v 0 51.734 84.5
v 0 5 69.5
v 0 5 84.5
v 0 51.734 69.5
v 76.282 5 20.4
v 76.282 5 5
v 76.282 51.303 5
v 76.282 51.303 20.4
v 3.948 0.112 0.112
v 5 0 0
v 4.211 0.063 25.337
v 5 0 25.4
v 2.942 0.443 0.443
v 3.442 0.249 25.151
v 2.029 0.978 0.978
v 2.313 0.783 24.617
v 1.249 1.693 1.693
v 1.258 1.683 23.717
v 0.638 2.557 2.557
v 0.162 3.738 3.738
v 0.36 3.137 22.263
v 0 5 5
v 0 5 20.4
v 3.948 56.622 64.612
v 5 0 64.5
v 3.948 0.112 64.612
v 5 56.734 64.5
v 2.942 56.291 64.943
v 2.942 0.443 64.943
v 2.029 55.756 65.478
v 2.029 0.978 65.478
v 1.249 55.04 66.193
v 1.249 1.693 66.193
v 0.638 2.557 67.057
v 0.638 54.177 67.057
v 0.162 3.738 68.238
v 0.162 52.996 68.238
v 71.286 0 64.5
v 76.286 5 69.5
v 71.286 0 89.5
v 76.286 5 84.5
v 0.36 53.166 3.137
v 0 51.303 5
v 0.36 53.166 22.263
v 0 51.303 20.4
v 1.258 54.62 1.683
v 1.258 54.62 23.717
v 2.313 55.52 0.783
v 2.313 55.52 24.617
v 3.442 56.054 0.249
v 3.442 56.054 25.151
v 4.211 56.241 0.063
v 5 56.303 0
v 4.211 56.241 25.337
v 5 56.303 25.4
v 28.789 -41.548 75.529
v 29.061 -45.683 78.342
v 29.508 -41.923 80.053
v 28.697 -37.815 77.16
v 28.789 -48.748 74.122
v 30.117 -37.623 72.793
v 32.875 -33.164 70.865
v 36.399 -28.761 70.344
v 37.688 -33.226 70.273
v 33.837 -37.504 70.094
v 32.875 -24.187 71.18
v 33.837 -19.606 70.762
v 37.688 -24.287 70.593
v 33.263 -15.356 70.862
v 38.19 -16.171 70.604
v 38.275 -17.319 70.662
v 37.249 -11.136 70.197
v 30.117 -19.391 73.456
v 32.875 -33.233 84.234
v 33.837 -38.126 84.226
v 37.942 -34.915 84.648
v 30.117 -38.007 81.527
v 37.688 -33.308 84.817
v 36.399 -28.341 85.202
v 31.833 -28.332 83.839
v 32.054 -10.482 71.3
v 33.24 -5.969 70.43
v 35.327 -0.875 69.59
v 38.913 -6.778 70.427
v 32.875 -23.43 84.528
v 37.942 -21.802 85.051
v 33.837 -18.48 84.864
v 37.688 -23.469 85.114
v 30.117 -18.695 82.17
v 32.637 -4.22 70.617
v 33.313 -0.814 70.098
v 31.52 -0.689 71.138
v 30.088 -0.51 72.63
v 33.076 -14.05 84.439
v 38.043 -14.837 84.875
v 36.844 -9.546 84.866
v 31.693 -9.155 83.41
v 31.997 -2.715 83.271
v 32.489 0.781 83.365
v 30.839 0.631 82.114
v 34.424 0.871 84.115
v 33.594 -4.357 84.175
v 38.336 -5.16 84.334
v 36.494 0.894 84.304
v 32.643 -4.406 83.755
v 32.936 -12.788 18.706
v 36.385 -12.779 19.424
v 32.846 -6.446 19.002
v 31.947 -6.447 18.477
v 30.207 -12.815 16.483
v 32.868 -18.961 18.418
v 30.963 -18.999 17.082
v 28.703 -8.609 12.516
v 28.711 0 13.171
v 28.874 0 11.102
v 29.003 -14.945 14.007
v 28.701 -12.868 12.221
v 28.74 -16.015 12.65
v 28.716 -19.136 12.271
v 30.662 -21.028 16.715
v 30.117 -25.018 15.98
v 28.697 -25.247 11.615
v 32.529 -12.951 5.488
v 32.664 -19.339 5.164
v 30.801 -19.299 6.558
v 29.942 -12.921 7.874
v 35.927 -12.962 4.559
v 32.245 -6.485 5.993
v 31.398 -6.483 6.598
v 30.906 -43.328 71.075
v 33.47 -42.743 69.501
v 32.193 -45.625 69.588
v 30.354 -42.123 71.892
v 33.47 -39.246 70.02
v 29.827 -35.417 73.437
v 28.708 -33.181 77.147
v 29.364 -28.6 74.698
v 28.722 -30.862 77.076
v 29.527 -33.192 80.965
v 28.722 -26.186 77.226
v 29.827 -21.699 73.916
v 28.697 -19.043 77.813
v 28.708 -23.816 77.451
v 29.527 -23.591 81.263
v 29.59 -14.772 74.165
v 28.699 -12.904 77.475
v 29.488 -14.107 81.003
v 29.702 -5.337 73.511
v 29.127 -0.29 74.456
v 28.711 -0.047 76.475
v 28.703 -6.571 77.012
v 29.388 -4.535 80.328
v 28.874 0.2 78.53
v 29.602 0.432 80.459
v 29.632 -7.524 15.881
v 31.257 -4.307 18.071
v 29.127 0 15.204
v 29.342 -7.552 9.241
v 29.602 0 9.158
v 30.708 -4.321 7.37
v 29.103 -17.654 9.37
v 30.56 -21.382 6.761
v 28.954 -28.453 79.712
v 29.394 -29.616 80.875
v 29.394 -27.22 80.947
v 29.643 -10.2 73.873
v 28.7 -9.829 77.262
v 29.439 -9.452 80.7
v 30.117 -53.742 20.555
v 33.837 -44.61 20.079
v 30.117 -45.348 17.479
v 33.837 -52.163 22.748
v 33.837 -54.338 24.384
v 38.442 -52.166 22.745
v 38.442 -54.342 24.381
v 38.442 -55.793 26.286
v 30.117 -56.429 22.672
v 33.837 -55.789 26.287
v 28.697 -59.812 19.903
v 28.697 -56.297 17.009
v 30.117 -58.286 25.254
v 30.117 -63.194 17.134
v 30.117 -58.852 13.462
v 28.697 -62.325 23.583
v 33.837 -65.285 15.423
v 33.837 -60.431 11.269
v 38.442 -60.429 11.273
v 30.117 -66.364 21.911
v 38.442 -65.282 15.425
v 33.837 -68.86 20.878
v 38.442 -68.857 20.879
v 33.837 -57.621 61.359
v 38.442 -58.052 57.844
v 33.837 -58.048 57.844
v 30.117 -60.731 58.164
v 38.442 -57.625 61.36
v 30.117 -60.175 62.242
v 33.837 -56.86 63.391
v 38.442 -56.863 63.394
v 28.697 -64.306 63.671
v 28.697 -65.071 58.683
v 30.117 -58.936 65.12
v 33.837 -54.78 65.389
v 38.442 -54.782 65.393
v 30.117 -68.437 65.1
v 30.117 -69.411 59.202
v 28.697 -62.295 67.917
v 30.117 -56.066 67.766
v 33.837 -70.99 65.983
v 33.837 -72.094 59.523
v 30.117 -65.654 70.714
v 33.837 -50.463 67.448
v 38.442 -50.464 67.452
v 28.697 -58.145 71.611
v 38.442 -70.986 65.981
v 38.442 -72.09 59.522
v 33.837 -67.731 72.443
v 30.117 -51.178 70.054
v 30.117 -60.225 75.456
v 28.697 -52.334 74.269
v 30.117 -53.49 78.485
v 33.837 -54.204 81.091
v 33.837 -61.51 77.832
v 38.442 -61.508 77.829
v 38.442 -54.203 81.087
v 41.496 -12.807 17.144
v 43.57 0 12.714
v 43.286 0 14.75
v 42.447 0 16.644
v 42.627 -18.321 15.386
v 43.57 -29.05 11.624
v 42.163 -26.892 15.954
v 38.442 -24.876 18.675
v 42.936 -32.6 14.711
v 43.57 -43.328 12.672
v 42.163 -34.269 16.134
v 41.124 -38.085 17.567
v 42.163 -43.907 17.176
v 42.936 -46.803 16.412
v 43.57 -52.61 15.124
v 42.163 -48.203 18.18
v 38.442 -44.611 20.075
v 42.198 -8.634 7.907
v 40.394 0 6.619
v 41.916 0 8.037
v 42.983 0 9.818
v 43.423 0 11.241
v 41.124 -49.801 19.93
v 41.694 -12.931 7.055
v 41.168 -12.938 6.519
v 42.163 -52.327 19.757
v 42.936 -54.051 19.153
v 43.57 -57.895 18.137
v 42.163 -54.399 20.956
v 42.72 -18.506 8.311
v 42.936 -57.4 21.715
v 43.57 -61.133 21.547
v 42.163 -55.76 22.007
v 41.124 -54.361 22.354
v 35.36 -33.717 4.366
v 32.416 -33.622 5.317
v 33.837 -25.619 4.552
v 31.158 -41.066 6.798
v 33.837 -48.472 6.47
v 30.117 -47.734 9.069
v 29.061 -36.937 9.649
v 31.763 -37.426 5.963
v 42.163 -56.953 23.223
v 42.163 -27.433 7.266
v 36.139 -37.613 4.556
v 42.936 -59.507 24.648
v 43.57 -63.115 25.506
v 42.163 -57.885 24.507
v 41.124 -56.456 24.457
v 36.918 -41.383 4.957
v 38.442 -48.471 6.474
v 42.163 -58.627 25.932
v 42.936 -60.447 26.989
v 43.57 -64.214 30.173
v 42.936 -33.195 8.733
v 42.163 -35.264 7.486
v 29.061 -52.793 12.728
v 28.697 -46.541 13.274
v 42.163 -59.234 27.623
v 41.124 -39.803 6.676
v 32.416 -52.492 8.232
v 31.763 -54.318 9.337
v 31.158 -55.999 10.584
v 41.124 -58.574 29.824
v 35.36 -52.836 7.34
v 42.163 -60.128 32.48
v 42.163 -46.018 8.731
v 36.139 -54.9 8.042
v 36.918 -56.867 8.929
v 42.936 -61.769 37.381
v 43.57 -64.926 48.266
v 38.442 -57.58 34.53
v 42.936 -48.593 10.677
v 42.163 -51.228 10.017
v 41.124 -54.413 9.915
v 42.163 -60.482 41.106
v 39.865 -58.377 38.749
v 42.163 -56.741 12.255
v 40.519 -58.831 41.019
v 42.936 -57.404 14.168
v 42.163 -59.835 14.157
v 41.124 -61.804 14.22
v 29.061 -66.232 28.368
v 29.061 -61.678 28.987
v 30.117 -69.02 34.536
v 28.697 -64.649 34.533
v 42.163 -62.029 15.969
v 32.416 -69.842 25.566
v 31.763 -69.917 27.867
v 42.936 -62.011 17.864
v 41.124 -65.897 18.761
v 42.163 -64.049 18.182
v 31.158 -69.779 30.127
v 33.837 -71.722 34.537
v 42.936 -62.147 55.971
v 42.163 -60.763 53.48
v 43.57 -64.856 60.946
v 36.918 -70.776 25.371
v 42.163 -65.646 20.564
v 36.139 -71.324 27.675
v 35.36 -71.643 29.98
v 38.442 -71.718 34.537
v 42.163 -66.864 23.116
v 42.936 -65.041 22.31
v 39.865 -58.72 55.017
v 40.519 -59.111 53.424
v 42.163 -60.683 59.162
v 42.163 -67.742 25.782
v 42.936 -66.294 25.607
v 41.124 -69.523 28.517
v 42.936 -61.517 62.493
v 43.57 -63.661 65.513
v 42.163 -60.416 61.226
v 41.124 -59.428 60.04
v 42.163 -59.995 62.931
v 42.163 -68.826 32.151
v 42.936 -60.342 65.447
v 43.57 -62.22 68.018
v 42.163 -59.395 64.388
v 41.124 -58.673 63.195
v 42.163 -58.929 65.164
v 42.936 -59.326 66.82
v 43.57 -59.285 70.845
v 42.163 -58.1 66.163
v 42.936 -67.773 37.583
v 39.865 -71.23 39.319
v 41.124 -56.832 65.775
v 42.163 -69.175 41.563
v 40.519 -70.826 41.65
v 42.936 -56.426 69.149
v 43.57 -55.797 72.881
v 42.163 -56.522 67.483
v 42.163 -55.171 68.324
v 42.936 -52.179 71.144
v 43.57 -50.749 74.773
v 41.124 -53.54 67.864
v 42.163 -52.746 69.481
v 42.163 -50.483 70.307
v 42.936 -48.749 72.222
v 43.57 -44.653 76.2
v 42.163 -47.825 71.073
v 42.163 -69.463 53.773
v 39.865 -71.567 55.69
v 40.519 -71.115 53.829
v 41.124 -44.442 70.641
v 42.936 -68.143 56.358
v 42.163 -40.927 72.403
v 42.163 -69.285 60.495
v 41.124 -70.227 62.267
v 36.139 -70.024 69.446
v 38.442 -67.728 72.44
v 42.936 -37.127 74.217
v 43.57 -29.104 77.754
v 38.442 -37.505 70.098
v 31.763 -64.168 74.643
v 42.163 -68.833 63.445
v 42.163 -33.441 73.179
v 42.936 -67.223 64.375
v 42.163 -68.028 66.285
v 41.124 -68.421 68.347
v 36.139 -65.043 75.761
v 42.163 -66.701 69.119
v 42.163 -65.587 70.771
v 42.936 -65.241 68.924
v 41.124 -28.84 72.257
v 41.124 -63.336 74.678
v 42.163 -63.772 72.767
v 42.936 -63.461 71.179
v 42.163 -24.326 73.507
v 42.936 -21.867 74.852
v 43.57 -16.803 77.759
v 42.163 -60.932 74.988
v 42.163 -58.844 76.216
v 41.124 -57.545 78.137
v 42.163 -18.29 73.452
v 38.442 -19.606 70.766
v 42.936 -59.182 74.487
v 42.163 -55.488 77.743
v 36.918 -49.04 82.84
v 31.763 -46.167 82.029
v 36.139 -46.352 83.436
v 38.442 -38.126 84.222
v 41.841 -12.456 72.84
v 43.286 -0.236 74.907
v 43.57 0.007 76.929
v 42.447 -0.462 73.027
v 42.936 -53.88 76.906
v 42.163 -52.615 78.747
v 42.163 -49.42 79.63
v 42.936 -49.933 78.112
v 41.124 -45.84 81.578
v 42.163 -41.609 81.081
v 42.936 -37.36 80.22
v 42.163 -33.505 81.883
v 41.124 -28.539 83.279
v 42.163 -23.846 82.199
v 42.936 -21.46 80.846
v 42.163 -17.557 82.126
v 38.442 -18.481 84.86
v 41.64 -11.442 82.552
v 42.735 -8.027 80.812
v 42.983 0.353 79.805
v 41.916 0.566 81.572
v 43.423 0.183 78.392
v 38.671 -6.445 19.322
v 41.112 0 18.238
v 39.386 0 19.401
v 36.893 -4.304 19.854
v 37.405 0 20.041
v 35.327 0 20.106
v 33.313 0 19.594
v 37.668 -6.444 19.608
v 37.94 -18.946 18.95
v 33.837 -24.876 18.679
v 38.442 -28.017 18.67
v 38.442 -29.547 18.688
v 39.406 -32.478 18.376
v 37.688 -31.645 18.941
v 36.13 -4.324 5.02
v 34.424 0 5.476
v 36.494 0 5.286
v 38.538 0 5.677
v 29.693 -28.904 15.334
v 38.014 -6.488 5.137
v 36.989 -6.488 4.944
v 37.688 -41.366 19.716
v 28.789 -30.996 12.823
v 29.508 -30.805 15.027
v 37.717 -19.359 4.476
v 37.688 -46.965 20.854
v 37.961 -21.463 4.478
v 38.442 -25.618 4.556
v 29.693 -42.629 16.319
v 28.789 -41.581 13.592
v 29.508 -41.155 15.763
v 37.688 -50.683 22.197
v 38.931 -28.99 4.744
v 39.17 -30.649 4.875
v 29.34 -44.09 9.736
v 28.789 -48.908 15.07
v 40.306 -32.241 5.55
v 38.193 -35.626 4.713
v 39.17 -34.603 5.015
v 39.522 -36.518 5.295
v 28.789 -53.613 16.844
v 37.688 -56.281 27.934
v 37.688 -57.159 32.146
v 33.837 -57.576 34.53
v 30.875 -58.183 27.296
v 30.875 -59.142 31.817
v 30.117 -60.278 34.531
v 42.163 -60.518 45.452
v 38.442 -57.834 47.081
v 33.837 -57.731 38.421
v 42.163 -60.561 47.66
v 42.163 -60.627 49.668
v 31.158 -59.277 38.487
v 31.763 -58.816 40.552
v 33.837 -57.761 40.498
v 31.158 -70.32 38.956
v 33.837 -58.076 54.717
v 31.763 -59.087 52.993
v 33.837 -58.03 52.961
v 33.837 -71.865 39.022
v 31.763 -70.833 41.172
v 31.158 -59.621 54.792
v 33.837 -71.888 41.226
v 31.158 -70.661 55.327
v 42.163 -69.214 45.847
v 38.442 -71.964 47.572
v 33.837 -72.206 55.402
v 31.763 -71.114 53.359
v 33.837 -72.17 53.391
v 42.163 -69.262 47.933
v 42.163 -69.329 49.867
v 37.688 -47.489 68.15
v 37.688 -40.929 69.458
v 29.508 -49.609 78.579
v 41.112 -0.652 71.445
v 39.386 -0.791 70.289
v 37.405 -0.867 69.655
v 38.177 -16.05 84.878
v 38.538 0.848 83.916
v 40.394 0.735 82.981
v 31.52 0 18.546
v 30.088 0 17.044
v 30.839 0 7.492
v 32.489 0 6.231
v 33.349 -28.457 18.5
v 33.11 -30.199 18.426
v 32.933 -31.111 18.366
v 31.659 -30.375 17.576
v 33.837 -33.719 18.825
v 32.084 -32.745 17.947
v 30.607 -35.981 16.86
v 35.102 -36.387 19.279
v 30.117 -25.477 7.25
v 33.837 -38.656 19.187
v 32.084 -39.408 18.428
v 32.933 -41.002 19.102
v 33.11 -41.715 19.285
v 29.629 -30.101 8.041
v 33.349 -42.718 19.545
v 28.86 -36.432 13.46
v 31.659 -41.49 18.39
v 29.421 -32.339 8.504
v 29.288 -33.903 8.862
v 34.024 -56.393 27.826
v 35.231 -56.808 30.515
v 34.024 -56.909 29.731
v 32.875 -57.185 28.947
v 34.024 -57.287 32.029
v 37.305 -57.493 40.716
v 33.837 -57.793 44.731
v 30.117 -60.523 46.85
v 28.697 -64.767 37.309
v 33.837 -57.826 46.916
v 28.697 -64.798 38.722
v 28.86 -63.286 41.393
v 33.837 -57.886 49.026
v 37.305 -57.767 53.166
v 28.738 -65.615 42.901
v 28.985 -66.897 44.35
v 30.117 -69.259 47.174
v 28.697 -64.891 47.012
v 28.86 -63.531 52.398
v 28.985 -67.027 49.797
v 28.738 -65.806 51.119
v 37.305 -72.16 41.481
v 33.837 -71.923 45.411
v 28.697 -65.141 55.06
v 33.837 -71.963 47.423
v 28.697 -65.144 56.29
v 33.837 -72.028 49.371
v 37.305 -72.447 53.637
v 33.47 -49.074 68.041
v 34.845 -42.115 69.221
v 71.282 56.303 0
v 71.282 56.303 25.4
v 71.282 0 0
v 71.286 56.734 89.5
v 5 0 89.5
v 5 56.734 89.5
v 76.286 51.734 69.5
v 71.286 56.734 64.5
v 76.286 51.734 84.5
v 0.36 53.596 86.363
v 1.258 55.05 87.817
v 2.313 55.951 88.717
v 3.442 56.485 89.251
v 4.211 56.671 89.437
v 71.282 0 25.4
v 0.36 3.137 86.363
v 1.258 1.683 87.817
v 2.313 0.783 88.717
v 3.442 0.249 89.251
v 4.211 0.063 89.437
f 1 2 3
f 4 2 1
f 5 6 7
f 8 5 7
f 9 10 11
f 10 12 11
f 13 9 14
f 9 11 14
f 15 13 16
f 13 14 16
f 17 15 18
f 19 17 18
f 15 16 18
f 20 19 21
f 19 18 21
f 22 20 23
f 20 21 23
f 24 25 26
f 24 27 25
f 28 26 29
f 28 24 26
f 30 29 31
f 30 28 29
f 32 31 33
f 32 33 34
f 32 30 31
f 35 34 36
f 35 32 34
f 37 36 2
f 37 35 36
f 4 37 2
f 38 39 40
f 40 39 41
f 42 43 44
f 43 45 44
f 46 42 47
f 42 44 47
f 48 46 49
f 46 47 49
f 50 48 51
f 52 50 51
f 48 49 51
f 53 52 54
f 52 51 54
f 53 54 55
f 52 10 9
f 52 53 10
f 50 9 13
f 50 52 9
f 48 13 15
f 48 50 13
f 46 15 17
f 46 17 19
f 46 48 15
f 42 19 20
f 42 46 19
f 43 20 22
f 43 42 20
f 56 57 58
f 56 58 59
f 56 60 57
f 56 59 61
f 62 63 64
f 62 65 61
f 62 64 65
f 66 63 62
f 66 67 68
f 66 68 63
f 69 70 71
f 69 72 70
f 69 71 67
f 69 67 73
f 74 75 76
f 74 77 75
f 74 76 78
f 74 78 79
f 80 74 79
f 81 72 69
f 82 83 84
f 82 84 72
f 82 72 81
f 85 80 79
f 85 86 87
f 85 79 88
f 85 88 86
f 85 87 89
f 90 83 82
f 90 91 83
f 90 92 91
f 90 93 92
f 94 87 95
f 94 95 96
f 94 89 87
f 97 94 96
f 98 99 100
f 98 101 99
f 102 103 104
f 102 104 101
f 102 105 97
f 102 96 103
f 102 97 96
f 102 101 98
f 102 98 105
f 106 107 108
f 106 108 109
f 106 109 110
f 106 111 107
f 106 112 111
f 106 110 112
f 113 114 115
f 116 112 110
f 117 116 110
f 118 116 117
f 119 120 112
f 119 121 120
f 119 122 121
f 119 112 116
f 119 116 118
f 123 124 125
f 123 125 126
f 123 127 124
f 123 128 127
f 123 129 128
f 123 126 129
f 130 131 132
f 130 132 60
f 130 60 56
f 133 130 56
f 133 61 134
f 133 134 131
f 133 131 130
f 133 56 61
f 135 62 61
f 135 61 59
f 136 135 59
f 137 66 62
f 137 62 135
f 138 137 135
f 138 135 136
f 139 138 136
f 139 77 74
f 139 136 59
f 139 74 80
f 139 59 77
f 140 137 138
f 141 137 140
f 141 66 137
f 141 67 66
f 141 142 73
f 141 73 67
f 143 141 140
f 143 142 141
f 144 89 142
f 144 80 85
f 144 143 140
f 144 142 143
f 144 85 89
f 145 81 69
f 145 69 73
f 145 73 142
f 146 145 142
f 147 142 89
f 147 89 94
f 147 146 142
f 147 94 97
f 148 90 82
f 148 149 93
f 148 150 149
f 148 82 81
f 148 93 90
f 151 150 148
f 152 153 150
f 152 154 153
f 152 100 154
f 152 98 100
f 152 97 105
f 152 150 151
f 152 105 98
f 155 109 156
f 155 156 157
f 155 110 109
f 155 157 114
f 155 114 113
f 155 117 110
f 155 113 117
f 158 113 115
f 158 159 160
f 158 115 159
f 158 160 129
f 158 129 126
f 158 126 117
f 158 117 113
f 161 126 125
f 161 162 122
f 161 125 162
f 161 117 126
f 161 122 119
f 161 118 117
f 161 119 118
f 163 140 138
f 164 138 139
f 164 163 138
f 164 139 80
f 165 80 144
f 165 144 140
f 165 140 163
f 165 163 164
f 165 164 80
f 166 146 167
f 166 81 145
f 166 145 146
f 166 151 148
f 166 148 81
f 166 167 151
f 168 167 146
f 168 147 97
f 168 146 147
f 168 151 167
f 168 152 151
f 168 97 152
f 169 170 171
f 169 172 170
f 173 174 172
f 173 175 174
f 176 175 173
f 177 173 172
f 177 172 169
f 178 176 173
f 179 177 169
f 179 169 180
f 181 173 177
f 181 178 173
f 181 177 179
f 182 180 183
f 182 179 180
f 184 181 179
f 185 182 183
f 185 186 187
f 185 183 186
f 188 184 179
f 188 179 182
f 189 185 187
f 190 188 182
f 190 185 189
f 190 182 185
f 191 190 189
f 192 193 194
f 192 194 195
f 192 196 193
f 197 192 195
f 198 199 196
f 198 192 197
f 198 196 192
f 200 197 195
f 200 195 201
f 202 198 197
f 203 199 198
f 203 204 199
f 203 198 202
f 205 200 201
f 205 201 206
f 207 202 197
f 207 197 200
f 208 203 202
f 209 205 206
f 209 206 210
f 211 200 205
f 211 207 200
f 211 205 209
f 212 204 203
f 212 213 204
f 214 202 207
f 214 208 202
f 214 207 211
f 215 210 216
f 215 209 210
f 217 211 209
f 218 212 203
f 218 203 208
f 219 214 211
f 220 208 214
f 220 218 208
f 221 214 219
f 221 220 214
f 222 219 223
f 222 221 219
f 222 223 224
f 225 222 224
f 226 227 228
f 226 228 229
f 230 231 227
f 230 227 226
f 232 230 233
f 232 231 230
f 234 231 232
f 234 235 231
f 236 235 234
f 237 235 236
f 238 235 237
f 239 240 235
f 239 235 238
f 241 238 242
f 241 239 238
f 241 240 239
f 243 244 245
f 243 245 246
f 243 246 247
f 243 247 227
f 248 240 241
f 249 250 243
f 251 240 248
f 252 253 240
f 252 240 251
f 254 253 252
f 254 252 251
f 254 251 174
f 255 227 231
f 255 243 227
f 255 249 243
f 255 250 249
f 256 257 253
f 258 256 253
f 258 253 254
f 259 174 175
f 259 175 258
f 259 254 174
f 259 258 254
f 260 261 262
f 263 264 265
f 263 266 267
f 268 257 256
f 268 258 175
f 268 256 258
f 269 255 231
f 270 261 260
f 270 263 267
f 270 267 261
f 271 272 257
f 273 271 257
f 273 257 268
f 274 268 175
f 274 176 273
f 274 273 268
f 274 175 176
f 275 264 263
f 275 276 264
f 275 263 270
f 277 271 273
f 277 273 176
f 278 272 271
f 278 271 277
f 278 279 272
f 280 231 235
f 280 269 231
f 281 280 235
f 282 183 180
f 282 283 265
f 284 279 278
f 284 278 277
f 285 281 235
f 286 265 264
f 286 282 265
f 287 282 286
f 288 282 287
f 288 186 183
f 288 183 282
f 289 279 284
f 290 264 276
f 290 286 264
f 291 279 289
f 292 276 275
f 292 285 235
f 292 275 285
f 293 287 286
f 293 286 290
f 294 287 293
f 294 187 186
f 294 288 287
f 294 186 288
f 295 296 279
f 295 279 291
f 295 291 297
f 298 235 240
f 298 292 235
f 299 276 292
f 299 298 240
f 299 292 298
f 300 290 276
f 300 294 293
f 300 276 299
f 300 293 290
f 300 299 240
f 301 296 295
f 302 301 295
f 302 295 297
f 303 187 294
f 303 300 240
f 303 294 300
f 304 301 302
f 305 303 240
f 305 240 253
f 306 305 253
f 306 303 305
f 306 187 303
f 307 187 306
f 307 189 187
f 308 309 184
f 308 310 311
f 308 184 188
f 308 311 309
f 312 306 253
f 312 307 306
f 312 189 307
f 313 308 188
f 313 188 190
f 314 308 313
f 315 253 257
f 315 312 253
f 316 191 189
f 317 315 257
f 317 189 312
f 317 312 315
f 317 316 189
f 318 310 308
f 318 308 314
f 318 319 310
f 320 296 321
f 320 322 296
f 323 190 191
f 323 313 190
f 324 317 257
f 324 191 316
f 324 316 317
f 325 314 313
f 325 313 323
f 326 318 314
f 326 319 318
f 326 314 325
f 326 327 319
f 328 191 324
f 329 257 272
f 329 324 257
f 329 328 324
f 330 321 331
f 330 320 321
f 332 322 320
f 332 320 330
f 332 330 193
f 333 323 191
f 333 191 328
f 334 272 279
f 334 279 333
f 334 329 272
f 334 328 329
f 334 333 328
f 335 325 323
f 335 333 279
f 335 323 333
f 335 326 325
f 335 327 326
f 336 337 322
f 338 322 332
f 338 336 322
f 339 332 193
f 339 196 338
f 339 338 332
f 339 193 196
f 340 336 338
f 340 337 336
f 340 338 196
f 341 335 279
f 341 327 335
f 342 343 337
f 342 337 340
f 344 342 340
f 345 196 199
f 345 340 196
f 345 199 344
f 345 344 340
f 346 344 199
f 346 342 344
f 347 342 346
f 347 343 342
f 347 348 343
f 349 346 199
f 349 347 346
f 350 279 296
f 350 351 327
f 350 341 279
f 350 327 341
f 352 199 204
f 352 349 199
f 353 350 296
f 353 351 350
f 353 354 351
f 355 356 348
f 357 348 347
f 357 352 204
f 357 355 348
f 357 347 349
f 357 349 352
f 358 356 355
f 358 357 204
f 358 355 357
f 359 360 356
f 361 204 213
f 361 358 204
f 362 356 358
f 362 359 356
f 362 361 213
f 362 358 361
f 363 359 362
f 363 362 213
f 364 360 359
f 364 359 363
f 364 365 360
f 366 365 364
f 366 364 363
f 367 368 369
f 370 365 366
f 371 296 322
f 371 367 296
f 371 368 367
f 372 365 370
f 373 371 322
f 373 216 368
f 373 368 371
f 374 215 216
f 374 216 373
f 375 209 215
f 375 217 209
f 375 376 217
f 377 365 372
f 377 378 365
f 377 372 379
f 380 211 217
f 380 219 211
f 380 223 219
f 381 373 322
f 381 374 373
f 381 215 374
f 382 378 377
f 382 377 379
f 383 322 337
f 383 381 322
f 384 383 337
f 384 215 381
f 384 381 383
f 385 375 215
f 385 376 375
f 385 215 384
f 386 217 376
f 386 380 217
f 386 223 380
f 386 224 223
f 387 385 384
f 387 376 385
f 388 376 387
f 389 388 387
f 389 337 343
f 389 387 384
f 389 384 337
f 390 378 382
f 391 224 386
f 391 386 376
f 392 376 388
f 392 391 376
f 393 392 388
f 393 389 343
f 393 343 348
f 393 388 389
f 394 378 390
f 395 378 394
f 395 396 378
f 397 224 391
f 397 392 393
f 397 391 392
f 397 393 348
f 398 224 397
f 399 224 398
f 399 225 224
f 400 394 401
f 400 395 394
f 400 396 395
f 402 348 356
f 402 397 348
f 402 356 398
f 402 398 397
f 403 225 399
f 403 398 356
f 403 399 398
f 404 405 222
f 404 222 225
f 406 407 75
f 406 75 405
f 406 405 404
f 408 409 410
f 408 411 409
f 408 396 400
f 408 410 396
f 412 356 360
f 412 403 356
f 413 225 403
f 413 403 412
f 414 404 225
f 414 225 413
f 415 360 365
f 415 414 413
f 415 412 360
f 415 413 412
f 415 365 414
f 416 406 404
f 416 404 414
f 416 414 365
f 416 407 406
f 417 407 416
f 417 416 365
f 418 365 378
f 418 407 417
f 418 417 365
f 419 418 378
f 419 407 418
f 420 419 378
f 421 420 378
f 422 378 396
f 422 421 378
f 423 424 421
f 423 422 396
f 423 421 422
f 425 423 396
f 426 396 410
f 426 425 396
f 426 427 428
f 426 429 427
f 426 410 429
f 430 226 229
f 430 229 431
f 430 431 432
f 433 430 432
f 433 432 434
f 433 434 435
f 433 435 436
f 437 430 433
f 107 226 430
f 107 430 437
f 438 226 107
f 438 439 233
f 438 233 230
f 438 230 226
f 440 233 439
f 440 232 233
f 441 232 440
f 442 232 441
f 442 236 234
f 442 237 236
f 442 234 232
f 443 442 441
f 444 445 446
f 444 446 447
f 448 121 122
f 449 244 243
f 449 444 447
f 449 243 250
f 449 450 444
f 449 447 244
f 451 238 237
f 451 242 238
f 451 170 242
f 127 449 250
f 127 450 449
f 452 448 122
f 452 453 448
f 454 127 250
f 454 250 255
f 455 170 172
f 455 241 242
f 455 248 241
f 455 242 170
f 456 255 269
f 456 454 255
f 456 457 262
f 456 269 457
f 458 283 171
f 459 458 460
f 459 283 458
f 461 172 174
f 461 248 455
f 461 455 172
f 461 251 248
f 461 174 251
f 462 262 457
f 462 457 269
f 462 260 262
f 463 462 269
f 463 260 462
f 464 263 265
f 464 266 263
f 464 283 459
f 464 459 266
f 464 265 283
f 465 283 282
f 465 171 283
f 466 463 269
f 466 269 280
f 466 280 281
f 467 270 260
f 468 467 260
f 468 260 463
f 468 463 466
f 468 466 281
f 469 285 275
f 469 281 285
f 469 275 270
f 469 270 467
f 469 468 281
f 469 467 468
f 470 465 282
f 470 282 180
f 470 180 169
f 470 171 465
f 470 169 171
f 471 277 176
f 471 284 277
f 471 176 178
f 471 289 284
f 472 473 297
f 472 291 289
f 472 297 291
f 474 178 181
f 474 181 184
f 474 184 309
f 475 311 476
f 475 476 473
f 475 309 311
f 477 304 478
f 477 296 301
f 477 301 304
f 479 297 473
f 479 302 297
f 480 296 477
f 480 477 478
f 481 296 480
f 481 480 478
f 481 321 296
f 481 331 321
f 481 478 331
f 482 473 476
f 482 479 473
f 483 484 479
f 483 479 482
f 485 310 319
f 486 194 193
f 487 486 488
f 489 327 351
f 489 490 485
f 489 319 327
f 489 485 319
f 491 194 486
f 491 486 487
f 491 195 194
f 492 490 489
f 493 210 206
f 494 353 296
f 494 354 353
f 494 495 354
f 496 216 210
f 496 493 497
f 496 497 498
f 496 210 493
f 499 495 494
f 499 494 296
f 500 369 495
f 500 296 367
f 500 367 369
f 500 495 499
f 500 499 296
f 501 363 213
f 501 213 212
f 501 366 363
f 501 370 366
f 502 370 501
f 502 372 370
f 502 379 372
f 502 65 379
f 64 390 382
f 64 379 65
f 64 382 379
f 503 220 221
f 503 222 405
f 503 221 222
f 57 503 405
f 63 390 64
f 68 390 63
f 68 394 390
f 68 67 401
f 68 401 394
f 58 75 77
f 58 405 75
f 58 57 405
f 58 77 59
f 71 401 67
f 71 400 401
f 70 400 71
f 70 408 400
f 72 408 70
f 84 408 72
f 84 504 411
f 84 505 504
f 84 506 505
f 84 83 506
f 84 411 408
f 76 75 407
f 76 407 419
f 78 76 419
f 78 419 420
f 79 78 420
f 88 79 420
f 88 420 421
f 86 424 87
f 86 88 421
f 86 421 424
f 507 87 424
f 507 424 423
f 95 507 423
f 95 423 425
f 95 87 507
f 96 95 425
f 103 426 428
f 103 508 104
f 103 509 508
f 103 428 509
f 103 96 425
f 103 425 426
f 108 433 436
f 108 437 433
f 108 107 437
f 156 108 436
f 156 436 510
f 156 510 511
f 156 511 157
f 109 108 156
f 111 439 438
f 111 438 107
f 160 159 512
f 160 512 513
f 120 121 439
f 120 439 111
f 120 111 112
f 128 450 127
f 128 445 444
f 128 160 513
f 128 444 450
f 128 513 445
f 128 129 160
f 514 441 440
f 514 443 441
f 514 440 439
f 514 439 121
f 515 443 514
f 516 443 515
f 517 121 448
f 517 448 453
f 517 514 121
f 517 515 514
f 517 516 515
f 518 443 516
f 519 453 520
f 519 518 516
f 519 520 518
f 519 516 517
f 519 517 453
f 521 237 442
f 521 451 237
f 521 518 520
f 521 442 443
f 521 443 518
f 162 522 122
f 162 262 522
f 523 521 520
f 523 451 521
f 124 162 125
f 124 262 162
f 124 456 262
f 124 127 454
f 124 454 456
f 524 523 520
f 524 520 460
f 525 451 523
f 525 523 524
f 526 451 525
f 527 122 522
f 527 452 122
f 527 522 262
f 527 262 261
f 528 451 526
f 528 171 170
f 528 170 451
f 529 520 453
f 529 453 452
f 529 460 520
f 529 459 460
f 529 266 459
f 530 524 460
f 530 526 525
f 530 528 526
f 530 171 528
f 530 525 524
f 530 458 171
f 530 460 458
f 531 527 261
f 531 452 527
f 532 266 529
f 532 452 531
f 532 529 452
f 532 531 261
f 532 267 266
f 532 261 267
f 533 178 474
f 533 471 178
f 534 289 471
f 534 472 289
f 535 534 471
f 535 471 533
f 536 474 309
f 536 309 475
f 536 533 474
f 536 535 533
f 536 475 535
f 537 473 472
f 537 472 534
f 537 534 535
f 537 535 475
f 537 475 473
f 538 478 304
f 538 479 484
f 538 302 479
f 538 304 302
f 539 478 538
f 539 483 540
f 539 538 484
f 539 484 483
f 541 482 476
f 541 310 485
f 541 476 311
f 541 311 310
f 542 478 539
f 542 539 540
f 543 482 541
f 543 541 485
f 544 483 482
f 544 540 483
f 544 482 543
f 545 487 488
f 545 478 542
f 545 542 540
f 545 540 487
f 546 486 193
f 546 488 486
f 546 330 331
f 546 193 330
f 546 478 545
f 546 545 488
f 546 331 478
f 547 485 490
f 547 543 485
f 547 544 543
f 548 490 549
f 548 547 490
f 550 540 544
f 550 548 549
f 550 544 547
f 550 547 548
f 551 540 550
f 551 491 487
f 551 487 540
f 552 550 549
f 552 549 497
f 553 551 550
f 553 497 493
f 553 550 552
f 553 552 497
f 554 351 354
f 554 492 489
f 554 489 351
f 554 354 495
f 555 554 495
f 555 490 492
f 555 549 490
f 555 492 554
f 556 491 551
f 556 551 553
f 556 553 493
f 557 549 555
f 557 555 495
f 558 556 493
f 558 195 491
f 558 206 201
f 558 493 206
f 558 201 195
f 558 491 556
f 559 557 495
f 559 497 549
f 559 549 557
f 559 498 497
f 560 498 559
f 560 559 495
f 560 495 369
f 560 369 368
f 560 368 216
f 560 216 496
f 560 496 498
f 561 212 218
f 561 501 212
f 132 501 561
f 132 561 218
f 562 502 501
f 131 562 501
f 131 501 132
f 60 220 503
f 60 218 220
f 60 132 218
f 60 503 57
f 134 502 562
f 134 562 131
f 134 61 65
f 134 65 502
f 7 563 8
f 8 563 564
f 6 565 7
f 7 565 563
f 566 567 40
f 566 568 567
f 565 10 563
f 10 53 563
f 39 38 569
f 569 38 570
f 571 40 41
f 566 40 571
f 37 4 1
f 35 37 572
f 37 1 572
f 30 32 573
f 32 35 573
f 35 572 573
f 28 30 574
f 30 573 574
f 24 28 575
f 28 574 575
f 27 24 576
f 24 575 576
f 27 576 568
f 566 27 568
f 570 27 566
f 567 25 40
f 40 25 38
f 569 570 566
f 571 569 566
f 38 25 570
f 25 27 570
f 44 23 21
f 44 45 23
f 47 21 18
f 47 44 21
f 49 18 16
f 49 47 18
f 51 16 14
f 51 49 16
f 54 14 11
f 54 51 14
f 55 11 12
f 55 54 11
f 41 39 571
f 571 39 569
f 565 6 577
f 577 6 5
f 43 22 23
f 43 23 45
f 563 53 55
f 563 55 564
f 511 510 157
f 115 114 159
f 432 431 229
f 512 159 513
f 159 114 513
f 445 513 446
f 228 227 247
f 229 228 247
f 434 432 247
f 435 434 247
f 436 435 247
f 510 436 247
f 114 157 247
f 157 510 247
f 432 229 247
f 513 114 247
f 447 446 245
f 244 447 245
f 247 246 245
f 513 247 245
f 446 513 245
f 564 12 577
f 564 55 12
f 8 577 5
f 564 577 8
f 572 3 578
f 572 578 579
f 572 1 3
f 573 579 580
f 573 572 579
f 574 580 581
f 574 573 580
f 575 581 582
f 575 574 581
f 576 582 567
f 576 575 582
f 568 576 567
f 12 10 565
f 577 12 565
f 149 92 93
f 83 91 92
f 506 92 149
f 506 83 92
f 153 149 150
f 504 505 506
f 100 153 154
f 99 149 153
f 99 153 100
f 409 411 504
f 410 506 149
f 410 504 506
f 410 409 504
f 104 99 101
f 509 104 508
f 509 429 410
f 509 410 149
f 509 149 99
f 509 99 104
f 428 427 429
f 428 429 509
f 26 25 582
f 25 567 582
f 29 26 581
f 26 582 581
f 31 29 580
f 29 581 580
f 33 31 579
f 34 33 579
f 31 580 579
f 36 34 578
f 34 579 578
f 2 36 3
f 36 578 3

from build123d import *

# Parameters (mm, degrees)
F0_W      = 76.2819349766
F0_H      = 56.3033334911
F1_DEPTH  = 25.4
F5_W      = 76.2861296535
F5_H      = 56.7338764668
F6_DEPTH  = 25
F2_R      = 7.4364907576
F9_SIZE   = 5
F9_2_SIZE = 5
F10_R     = 5
F10_2_R   = 5


with BuildPart() as f1:
    # F0 (on Top) → F1 (new body)
    with BuildSketch(Plane.XY):
        with Locations((38.1409674883, 28.1516667455)):
            Rectangle(F0_W, F0_H)
    extrude(amount=F1_DEPTH)

    # F9
    f9_edges = [f1.edges().sort_by_distance(p)[0] for p in [
        (76.281935, 0, 12.7),
        (76.281935, 56.303333, 12.7),
        (76.281935, 28.151667, 0),
        (76.281935, 28.151667, 25.4),
    ]]
    chamfer(f9_edges, length=F9_SIZE)

    # F10#2
    f10_2_edges = [f1.edges().sort_by_distance(p)[0] for p in [
        (0, 56.303333, 12.7),
        (0, 28.151667, 25.4),
        (0, 28.151667, 0),
        (0, 0, 12.7),
    ]]
    fillet(f10_2_edges, radius=F10_2_R)


with BuildPart() as f6:
    # F5 (on offset) → F6 (new body)
    with BuildSketch(Plane.XY.offset(64.5)):
        with Locations((38.1430648267, 28.3669382334)):
            Rectangle(F5_W, F5_H)
    extrude(amount=F6_DEPTH)

    # F9#2
    f9_2_edges = [f6.edges().sort_by_distance(p)[0] for p in [
        (76.28613, 0, 77),
        (76.28613, 28.366938, 64.5),
        (76.28613, 28.366938, 89.5),
        (76.28613, 56.733876, 77),
    ]]
    chamfer(f9_2_edges, length=F9_2_SIZE)

    # F10
    f10_edges = [f6.edges().sort_by_distance(p)[0] for p in [
        (0, 28.366938, 89.5),
        (0, 0, 77),
        (0, 28.366938, 64.5),
        (0, 56.733876, 77),
    ]]
    fillet(f10_edges, radius=F10_R)


with BuildPart() as f8:
    # F8: sweep along a path in F7
    with BuildLine(Plane.YZ.offset(36.1)) as f8_path:
        add(Plane.YZ.offset(36.1) * Edge.make_bspline(
            [(0, 12.7756176516), (-17.2697575306, 11.7372232342), (-45.5167533298, 10.0387904279), (-65.7940215498, 21.7233568099), (-64.0425767682, 47.1450165386), (-67.0013923917, 71.3227707408), (-36.0403337757, 79.0190550942), (-12.7302498079, 77.6276400959), (0, 76.8677517772)],
            knots=[0, 0, 0, 0, 0.2141455006, 0.3502635775, 0.5034552398, 0.6465054075, 0.8069473077, 1, 1, 1, 1], degree=3))
    # F2 (on face) → F8 (sweep)
    with BuildSketch(Plane.XZ):
        with Locations((36.1335463822, 12.7136567608)):
            Circle(F2_R)
    sweep(path=f8_path.line)


solid = Compound([f1.part, f6.part, f8.part])
